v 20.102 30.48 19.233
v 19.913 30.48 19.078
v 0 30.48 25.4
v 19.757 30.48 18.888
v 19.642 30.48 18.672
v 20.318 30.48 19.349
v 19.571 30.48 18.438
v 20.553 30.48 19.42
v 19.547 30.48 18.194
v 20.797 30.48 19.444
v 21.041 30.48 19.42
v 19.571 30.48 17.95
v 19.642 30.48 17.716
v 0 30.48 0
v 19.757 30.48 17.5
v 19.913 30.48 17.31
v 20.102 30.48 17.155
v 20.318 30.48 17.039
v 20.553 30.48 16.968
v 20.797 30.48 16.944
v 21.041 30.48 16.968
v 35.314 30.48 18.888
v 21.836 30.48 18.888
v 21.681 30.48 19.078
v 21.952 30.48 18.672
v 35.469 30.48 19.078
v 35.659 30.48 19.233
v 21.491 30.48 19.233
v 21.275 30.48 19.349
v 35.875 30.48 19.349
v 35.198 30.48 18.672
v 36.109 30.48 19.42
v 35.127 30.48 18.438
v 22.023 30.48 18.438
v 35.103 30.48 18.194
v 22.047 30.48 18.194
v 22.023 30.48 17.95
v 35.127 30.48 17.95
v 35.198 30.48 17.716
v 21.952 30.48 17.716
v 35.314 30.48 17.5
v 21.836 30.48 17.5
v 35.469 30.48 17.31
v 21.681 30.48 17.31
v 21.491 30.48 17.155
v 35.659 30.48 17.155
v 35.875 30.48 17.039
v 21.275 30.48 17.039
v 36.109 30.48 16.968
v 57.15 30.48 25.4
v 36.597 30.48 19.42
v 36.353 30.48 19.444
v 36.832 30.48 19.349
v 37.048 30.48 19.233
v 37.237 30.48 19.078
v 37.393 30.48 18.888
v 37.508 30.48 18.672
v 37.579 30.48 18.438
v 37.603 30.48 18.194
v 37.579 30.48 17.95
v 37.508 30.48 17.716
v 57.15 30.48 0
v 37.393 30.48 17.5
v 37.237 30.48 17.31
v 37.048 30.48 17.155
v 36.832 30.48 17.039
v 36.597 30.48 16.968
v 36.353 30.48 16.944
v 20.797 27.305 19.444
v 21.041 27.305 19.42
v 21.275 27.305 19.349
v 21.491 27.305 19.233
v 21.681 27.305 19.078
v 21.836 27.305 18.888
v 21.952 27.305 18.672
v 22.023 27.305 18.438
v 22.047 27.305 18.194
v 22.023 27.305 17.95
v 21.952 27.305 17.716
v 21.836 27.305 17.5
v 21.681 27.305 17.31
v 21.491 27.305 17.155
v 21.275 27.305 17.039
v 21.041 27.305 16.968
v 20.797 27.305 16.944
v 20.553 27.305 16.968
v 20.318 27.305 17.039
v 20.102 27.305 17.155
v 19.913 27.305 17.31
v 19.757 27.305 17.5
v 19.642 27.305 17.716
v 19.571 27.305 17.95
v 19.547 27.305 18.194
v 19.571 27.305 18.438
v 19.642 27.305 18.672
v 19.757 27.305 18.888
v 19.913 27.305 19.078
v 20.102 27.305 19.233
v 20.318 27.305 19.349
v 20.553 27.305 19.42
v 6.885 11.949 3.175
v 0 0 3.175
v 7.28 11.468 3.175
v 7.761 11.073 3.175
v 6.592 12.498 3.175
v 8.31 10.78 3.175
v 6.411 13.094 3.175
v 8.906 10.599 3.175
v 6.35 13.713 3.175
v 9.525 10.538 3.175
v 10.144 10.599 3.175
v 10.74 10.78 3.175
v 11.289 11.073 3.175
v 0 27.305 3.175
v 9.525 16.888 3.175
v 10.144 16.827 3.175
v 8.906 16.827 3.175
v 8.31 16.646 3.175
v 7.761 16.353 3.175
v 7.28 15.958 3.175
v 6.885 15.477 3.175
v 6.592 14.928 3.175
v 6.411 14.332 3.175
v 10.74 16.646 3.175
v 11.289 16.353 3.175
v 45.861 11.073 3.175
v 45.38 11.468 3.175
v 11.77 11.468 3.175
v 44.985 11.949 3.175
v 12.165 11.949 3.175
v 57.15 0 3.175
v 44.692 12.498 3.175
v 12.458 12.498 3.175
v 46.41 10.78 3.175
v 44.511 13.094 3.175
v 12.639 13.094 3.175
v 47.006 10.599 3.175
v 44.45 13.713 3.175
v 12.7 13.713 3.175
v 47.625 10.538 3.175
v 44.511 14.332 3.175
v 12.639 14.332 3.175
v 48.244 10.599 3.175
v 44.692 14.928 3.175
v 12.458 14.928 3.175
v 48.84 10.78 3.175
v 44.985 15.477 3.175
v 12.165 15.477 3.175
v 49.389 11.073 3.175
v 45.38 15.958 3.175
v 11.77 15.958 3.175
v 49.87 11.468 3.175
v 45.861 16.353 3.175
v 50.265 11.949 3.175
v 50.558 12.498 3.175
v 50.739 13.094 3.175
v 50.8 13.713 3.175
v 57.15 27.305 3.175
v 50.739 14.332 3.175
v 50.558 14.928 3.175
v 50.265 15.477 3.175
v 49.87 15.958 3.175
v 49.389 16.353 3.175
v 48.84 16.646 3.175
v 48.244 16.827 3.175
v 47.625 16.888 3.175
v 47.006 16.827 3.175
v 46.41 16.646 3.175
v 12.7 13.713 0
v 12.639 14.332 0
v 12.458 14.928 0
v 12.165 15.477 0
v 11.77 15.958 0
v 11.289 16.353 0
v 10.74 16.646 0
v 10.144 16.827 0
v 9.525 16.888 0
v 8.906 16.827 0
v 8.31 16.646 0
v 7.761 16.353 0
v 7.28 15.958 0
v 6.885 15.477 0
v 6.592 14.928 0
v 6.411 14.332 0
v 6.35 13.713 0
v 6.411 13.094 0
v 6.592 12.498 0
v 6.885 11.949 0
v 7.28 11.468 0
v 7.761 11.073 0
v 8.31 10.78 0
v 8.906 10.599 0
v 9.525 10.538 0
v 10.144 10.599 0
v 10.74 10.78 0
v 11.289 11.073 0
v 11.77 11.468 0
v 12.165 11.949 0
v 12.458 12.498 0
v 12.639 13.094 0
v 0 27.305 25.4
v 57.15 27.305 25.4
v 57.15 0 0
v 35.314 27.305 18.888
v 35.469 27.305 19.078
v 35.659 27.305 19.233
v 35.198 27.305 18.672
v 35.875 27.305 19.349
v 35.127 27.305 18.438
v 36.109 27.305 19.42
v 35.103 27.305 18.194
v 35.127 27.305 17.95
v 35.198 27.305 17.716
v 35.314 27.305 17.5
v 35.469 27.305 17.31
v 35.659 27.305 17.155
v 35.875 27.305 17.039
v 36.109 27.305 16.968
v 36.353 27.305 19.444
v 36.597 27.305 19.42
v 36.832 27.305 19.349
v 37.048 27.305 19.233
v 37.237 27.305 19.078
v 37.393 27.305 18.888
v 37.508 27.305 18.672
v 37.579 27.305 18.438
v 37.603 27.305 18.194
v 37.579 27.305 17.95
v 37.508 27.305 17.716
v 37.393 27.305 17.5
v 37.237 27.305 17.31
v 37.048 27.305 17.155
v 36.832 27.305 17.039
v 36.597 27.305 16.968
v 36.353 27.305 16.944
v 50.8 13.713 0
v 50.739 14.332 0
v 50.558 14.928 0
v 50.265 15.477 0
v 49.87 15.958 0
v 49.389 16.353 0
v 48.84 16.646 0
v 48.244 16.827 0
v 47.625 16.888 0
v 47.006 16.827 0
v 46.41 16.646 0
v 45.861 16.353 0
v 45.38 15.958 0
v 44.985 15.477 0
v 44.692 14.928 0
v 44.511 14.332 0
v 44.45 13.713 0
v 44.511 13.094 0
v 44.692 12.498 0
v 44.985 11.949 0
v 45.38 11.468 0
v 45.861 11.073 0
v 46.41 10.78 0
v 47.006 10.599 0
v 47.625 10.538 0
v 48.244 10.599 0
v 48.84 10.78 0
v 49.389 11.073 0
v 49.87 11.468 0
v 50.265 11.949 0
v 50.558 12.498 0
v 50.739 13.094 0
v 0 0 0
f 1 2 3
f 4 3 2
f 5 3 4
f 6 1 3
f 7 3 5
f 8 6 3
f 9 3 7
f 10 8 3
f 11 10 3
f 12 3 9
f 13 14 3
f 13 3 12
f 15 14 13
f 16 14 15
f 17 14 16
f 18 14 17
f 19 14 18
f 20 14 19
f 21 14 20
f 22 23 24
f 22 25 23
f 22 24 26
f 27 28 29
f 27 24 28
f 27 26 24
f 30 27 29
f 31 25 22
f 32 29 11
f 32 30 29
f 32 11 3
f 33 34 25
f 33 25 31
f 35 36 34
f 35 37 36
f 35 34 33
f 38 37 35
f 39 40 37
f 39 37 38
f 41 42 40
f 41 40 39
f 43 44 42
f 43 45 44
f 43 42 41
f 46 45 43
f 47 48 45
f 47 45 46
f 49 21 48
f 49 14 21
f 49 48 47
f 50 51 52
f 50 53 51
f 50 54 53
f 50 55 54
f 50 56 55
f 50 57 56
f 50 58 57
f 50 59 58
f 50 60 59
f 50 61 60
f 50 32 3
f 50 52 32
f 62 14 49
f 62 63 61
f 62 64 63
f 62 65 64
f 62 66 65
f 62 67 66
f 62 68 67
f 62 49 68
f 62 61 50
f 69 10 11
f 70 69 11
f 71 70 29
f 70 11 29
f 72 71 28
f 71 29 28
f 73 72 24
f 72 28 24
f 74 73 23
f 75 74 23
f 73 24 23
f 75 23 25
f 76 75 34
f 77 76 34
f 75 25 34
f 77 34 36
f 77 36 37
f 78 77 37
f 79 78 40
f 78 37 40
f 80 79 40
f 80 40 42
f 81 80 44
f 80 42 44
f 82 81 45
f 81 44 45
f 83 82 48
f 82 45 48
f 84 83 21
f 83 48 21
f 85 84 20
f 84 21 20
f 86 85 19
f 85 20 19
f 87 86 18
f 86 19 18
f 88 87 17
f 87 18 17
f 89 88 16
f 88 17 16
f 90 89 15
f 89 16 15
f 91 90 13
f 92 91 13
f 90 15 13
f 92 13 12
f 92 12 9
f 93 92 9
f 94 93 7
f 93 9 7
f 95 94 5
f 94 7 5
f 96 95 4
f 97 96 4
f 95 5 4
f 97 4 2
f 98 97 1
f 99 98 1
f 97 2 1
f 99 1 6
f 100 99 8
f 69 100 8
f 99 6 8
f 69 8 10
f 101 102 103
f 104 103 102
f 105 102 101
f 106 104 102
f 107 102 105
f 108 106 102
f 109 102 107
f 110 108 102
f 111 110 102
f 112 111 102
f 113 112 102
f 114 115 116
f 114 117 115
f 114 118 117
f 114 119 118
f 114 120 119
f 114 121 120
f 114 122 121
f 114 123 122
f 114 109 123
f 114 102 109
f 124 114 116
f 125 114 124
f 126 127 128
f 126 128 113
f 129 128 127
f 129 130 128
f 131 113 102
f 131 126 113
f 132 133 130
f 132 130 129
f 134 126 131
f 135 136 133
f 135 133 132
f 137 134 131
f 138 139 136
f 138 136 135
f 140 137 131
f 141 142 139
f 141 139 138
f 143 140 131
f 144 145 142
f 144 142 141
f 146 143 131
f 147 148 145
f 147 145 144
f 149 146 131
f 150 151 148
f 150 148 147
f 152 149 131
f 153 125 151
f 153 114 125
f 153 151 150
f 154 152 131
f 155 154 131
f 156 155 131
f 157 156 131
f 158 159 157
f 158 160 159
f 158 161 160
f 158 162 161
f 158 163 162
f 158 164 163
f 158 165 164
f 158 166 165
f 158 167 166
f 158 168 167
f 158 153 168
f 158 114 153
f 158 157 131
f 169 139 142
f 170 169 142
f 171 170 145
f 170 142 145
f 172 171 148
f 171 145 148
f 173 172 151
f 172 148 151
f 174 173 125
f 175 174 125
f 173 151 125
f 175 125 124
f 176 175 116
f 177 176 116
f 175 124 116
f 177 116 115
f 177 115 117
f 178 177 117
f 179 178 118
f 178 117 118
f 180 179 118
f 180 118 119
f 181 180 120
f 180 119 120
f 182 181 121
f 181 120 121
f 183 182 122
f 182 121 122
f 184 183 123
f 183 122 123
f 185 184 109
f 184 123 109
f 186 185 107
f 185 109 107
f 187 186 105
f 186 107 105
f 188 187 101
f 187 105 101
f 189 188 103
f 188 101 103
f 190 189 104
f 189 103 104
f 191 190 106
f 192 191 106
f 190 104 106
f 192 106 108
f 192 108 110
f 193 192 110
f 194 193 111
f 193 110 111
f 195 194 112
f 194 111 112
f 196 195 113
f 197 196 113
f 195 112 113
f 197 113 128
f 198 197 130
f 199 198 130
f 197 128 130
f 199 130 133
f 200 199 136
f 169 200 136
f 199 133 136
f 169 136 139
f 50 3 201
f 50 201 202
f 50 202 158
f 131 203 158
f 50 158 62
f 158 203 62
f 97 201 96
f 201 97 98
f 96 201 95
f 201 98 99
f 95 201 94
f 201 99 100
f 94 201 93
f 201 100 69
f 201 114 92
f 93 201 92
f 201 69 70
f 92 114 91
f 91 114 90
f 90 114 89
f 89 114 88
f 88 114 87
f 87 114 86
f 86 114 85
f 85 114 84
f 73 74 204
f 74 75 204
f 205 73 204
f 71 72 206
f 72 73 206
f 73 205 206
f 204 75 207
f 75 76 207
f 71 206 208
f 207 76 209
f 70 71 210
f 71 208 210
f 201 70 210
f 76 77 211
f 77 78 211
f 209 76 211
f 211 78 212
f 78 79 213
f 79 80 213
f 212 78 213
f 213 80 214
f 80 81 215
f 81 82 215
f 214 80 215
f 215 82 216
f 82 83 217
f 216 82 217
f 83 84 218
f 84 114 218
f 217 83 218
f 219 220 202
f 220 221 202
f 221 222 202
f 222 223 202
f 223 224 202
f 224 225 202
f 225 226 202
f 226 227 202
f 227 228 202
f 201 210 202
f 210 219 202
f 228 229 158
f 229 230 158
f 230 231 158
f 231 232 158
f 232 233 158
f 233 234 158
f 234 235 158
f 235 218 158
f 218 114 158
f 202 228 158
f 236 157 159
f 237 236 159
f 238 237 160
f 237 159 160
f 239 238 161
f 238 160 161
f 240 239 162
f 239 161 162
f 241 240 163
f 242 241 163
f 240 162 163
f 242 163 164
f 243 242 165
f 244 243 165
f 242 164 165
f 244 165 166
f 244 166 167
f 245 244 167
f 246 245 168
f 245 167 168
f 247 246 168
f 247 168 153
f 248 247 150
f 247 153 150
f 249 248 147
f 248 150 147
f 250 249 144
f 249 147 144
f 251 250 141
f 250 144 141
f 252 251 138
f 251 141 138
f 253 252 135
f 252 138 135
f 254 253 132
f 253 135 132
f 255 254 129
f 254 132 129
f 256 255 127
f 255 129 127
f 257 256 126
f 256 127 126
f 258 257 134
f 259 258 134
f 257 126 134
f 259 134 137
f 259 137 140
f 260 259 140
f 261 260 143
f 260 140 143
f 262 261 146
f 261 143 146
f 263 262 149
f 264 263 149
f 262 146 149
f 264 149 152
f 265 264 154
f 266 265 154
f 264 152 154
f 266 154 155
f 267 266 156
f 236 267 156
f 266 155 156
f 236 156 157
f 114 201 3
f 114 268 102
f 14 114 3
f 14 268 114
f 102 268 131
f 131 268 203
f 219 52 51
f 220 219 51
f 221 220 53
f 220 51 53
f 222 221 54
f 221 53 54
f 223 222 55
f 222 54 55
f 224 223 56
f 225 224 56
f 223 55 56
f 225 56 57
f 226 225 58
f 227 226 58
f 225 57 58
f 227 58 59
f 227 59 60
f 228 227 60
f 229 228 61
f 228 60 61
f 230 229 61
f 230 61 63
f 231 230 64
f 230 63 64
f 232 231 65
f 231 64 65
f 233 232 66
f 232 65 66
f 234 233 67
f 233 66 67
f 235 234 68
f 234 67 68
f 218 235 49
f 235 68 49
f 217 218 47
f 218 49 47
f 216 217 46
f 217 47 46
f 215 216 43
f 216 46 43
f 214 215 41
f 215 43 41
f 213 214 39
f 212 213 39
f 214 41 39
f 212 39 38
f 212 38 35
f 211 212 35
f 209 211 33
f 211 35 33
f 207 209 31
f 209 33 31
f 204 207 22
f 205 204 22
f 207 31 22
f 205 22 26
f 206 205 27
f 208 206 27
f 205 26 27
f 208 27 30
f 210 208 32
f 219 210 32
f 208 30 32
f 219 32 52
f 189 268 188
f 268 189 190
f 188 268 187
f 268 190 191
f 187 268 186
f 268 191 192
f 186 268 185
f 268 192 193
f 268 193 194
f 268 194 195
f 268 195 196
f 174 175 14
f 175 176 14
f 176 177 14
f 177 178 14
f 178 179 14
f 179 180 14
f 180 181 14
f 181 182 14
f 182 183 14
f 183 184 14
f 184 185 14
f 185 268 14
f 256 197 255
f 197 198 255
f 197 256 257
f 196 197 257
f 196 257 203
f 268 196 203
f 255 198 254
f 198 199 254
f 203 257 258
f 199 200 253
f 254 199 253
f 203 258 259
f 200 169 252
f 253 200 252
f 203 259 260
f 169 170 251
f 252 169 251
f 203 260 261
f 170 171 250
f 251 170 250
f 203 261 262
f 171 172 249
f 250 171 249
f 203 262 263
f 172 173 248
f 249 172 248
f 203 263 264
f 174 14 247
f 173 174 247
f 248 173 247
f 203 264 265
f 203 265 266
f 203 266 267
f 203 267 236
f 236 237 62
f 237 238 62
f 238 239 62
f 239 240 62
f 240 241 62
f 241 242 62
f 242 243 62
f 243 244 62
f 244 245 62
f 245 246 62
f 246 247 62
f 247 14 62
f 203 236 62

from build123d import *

# Parameters (mm, degrees)
SKETCH3_W           = 57.15
SKETCH3_H           = 30.48
BOSS_EXTRUDE2_DEPTH = 3.175
SKETCH4_W           = 57.15
SKETCH4_H           = 3.175
BOSS_EXTRUDE3_DEPTH = 22.225
SKETCH6_R           = 1.25
CUT_EXTRUDE1_DEPTH  = 3.175
SKETCH7_R           = 3.175
CUT_EXTRUDE2_DEPTH  = 3.175


with BuildPart() as part:
    # Sketch3 → Boss-Extrude2 (new body)
    with BuildSketch(Plane.XY):
        with Locations((28.575, 15.24)):
            Rectangle(SKETCH3_W, SKETCH3_H)
    extrude(amount=BOSS_EXTRUDE2_DEPTH)

    # Sketch4 → Boss-Extrude3 (add)
    with BuildSketch(Plane.XY.offset(3.175)):
        with Locations((28.575, 28.8925)):
            Rectangle(SKETCH4_W, SKETCH4_H)
    extrude(amount=BOSS_EXTRUDE3_DEPTH)

    # Sketch6 → Cut-Extrude1 (cut)
    with BuildSketch(Plane(origin=(0, 30.48, 0), x_dir=(1, 0, 0), z_dir=(0, 1, 0))):
        with Locations(Location((36.353174593, -18.1939997, 0), (0, 0, 270))):
            Circle(SKETCH6_R)
        with Locations(Location((20.796825407, -18.1939997, 0), (0, 0, 270))):
            Circle(SKETCH6_R)
    extrude(amount=-CUT_EXTRUDE1_DEPTH, mode=Mode.SUBTRACT)

    # Sketch7 → Cut-Extrude2 (cut)
    with BuildSketch(Plane.XY.offset(3.175)):
        with Locations((47.625, 13.713)):
            Circle(SKETCH7_R)
        with Locations((9.525, 13.713)):
            Circle(SKETCH7_R)
    extrude(amount=-CUT_EXTRUDE2_DEPTH, mode=Mode.SUBTRACT)


solid = part.part
